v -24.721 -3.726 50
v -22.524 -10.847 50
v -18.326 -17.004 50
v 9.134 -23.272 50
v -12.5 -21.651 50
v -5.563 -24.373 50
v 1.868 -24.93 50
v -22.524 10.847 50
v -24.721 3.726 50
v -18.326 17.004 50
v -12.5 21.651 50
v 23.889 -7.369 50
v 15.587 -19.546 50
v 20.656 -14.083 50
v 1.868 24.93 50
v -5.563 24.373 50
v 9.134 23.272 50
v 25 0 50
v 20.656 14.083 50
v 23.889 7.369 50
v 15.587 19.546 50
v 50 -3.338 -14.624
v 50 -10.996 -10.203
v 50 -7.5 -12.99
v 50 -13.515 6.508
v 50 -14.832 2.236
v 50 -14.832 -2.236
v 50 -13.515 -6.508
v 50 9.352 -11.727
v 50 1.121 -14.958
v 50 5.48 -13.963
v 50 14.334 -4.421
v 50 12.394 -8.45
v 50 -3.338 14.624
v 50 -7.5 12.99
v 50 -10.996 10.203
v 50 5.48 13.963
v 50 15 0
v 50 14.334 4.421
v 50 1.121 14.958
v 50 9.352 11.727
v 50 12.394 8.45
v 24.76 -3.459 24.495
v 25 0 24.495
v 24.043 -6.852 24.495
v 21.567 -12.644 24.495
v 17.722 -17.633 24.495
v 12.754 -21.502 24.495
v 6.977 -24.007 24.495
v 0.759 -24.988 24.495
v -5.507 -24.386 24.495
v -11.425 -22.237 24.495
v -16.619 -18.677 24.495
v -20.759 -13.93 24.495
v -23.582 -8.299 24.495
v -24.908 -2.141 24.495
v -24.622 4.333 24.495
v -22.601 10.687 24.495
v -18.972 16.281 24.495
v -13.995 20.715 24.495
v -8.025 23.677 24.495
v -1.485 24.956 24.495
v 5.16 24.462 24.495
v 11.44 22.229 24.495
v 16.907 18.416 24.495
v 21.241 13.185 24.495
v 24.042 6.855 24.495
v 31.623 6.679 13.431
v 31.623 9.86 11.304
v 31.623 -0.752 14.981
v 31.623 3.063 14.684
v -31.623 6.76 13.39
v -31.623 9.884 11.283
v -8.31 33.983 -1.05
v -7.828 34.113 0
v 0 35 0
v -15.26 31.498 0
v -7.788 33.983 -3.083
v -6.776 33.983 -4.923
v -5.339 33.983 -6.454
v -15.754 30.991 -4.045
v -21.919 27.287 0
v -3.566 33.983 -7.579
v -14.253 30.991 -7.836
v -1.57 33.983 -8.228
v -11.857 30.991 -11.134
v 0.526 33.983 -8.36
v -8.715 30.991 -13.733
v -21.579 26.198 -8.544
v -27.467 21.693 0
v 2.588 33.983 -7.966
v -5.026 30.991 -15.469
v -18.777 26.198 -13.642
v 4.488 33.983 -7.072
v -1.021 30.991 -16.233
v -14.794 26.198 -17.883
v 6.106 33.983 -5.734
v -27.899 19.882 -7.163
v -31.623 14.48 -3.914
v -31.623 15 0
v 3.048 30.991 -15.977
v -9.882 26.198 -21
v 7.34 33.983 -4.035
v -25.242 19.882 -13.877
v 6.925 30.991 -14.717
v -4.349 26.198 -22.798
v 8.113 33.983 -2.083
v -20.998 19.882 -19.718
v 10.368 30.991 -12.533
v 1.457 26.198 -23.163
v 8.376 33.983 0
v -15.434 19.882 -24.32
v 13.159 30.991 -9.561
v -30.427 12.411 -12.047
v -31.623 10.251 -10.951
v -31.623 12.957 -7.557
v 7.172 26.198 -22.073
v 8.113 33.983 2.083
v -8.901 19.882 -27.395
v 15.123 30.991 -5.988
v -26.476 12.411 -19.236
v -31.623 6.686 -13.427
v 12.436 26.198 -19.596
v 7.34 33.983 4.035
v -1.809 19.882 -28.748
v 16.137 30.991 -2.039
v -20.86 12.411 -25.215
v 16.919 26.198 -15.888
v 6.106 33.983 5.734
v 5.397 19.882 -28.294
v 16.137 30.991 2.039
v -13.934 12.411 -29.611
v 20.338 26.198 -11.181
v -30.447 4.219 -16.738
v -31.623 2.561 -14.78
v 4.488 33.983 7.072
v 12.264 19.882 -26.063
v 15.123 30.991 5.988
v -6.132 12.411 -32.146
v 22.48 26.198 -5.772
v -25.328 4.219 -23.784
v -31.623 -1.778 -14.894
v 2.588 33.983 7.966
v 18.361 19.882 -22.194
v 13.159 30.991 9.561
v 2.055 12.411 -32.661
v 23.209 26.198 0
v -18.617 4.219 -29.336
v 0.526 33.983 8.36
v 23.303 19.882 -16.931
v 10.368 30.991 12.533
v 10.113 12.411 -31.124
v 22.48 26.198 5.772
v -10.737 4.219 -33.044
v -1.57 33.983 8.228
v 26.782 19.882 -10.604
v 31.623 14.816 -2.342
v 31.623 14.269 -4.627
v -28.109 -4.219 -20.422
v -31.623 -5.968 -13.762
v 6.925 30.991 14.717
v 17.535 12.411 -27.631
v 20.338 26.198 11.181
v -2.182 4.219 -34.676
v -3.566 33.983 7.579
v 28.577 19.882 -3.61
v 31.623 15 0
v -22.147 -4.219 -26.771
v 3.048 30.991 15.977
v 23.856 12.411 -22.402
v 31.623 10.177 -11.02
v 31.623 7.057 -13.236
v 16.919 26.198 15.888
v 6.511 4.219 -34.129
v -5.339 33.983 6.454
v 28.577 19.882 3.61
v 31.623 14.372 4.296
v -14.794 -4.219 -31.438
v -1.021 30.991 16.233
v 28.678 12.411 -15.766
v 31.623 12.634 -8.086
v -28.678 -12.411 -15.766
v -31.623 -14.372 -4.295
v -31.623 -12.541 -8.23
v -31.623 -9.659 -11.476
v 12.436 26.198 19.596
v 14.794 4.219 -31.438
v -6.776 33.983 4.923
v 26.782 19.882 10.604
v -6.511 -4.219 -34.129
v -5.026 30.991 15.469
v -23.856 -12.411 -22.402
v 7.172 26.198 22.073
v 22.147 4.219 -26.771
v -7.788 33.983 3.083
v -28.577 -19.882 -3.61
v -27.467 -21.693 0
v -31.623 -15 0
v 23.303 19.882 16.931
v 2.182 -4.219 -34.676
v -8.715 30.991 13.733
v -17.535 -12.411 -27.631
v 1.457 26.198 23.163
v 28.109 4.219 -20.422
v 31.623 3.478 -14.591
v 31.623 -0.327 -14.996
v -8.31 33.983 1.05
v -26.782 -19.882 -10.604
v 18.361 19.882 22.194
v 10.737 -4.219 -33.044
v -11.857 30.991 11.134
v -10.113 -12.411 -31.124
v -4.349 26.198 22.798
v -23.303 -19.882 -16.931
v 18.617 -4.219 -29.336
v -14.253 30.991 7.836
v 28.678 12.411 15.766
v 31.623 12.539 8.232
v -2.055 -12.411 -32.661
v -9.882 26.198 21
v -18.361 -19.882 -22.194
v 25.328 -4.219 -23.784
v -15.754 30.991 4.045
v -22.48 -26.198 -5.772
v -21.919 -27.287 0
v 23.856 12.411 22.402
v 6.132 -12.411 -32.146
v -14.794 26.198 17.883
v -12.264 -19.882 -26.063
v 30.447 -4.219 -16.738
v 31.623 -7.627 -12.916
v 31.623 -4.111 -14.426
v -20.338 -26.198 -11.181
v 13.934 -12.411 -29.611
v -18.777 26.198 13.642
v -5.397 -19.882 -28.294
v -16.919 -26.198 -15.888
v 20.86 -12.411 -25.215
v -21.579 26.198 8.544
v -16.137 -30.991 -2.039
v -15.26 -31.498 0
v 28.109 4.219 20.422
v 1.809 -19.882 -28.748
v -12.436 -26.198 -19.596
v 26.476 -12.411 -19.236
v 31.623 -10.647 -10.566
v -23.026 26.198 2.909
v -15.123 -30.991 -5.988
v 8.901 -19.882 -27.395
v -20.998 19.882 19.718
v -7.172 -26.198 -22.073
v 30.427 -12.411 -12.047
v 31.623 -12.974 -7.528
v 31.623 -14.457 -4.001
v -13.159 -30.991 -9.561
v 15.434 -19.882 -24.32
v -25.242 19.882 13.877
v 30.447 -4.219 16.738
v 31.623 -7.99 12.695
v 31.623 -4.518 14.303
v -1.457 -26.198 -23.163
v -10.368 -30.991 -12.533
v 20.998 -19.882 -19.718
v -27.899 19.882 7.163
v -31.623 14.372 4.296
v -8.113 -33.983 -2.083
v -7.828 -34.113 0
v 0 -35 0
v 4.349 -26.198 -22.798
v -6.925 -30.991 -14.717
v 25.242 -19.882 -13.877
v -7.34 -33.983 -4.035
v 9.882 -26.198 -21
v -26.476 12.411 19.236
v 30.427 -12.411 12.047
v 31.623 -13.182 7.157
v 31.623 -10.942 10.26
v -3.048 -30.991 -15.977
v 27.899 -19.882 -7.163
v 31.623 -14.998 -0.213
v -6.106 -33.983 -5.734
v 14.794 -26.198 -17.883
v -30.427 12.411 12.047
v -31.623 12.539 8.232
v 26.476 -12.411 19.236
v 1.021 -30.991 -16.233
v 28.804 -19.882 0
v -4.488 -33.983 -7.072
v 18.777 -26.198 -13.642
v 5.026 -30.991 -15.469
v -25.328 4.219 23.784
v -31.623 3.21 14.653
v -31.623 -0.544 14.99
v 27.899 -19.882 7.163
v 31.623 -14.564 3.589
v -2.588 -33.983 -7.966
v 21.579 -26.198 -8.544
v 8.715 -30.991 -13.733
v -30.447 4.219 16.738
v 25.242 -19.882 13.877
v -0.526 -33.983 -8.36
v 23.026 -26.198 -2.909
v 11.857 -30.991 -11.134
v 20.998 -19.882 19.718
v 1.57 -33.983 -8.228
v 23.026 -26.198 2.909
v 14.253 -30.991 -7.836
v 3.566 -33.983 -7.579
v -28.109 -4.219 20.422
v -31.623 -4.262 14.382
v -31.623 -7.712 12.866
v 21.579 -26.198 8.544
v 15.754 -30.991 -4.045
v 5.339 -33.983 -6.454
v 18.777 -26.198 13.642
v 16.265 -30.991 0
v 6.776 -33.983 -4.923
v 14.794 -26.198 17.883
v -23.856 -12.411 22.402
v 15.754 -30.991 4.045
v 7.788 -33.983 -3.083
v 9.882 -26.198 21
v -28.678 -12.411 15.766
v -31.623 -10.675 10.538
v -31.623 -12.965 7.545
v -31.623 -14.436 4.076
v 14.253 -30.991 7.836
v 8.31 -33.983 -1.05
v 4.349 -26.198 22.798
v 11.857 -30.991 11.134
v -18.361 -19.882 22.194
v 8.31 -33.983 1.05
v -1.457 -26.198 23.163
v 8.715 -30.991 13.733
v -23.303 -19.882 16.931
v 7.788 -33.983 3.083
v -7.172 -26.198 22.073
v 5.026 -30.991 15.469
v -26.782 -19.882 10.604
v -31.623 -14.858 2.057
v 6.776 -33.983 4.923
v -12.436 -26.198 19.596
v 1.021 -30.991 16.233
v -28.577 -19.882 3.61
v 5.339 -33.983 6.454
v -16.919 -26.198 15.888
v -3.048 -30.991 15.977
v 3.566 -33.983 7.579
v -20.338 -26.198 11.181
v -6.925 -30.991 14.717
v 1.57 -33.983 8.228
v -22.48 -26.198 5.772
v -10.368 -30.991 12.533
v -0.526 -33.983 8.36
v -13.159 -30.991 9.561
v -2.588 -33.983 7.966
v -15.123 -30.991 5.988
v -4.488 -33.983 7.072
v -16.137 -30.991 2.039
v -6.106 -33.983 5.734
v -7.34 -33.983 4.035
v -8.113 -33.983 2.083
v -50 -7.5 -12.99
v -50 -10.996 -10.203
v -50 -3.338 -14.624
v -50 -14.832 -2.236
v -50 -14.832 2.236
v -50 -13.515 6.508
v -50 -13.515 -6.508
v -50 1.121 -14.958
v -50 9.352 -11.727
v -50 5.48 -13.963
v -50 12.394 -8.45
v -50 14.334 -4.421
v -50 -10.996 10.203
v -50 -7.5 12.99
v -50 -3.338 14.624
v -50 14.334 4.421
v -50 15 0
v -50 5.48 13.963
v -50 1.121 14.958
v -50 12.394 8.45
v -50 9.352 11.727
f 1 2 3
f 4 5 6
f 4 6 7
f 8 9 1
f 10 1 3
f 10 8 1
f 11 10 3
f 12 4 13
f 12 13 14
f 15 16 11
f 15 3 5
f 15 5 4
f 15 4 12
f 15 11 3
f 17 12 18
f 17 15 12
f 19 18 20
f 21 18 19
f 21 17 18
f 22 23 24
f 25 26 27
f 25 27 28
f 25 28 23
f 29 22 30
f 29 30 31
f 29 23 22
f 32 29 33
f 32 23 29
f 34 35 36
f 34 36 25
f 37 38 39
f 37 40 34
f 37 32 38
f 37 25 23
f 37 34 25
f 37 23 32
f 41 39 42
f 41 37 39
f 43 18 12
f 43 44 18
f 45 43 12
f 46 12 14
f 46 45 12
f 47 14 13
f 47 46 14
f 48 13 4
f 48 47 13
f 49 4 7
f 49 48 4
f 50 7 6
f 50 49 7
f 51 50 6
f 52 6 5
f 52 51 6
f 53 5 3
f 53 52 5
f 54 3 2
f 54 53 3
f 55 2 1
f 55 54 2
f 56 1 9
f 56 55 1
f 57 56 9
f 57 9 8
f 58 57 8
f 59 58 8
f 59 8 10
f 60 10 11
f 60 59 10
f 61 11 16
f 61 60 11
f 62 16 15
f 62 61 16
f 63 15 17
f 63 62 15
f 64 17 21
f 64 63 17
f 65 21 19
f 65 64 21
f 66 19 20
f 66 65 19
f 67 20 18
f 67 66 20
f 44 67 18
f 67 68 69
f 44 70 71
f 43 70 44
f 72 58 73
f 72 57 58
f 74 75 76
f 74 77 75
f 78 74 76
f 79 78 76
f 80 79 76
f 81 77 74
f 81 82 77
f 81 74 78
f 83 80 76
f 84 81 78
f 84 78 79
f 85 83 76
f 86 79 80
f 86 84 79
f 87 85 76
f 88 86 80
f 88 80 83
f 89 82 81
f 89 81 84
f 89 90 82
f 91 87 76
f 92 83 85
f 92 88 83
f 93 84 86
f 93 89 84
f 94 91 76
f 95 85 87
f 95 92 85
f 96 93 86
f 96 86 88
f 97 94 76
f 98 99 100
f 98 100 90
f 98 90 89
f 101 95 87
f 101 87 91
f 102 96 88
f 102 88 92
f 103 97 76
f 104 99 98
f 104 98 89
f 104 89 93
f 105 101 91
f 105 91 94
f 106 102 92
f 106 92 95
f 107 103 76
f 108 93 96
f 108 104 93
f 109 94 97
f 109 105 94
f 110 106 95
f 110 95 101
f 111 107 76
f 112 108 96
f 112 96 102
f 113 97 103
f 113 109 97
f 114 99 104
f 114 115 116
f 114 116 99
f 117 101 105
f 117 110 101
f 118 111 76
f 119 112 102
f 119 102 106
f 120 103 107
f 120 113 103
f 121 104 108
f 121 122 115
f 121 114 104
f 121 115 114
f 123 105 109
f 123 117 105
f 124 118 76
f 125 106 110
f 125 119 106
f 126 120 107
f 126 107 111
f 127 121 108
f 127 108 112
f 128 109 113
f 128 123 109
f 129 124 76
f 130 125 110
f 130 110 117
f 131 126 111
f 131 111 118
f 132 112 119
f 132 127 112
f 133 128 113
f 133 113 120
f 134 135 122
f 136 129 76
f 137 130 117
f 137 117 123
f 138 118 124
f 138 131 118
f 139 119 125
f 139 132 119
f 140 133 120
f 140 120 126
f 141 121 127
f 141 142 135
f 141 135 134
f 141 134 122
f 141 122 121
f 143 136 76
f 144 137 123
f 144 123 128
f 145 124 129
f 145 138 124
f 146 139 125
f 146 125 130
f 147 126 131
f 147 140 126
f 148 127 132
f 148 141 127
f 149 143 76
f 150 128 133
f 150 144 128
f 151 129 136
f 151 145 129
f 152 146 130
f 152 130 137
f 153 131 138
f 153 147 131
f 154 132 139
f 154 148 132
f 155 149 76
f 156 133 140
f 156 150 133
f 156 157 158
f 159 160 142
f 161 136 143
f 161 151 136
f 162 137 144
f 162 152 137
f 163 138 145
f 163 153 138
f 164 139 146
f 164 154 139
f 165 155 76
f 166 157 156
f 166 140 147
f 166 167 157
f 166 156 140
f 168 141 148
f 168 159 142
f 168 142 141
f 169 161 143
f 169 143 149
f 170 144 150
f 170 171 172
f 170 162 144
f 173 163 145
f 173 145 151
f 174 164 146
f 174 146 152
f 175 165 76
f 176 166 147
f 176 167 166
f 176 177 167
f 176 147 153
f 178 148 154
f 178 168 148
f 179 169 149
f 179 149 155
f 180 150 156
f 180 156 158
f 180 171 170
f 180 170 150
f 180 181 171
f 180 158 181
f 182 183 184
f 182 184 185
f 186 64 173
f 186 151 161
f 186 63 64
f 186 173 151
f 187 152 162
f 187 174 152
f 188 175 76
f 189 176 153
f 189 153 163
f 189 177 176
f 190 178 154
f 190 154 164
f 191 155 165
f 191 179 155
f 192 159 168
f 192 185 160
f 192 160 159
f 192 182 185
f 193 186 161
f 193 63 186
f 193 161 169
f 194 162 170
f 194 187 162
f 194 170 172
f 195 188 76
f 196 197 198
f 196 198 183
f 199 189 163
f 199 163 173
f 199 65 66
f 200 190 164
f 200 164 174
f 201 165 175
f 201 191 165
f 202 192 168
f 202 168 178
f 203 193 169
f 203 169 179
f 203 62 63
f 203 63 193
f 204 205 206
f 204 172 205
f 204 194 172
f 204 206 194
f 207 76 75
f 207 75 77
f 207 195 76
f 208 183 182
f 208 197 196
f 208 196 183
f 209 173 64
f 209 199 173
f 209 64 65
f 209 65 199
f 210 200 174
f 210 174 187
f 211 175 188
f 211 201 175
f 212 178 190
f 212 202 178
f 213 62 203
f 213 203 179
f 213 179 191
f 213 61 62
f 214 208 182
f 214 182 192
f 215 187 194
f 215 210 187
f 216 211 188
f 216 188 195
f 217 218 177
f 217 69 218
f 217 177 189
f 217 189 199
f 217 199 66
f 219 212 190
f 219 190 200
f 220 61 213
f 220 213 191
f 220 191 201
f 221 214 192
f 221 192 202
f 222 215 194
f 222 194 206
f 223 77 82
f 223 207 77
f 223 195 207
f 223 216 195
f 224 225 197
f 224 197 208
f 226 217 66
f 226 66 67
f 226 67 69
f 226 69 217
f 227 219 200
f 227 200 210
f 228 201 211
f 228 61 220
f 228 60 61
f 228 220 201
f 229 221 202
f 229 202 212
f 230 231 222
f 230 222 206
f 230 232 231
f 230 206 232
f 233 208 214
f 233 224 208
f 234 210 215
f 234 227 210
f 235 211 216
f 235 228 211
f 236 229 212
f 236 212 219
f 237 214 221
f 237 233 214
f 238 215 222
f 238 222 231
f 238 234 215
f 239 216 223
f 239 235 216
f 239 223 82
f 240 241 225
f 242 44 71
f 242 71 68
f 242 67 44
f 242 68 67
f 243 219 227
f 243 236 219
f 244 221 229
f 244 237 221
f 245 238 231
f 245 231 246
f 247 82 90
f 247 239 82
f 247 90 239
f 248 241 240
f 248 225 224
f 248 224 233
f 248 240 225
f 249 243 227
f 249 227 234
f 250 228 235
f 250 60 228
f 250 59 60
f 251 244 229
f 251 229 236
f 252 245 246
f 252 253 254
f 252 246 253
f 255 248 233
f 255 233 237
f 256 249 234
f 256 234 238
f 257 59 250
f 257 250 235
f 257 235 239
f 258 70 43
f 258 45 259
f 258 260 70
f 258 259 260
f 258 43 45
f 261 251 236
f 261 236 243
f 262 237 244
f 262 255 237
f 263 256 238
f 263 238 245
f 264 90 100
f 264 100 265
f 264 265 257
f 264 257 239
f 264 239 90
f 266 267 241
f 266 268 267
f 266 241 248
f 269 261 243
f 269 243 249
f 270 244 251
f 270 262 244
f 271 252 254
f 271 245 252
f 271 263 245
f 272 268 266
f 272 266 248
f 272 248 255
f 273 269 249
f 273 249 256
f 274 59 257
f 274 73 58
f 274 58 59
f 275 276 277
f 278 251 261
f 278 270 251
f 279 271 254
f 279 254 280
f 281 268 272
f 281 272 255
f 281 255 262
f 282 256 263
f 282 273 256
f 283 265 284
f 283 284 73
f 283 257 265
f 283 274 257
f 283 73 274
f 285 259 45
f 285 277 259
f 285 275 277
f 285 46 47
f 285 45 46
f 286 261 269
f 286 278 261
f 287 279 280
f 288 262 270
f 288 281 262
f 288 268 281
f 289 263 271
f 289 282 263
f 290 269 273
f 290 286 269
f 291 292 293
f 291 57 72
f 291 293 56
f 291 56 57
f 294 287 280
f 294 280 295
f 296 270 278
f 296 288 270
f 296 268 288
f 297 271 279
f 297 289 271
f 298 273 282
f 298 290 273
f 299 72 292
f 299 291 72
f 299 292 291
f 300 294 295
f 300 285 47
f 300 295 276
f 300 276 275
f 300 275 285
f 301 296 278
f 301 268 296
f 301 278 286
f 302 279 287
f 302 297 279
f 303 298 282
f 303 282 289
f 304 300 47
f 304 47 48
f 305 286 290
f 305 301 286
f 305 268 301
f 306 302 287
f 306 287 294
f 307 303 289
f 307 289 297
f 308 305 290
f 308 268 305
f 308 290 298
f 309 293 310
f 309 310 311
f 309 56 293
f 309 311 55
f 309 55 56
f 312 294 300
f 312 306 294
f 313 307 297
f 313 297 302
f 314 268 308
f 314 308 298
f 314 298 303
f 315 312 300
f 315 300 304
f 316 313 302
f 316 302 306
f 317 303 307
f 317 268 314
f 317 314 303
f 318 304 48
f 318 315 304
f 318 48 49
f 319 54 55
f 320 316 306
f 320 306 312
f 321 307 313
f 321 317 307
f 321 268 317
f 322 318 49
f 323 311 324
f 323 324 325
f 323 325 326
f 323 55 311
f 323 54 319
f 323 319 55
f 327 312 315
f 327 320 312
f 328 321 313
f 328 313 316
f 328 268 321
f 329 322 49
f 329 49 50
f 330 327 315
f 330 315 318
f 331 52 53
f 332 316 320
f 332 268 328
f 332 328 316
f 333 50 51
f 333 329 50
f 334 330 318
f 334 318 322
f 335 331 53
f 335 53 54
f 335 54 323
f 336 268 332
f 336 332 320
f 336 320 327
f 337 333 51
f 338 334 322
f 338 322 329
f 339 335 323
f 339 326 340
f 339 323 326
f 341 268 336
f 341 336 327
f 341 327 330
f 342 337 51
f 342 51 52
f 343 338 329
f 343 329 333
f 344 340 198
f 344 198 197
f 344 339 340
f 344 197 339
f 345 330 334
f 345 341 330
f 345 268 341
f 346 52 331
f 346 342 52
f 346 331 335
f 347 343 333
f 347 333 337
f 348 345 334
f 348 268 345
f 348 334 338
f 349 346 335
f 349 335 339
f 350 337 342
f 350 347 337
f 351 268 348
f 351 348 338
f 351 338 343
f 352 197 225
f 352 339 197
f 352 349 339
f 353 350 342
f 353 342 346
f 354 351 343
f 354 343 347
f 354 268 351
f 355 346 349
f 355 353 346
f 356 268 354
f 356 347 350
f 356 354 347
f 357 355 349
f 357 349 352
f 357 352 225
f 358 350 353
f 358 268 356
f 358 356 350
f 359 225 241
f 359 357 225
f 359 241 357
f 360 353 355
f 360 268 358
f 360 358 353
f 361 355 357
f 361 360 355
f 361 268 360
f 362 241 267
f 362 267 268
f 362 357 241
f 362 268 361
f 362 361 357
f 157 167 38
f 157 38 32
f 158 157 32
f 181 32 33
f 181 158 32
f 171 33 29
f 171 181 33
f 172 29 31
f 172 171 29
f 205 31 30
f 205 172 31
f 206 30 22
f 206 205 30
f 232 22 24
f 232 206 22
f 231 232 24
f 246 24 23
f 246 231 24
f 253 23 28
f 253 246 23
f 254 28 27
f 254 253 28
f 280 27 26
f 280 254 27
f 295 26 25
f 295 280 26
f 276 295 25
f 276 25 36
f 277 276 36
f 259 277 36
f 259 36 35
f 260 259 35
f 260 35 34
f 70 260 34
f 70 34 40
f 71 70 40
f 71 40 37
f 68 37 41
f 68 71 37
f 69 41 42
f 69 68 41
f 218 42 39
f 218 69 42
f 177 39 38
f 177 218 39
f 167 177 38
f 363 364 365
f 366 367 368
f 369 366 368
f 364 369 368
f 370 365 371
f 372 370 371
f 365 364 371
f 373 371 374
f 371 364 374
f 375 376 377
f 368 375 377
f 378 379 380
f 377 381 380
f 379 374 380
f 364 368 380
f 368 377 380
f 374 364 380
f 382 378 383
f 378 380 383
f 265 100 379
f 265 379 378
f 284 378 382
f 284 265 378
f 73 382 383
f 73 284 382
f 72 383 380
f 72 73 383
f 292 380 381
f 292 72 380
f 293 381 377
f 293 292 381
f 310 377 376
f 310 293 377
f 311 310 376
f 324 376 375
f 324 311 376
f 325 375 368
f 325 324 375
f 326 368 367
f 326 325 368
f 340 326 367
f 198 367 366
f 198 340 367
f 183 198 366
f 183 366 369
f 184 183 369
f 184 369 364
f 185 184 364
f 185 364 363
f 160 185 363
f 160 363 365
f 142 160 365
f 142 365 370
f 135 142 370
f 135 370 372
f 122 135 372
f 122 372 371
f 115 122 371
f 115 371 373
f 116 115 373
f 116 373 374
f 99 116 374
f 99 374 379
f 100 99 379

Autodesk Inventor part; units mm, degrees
ref_plane "XZ Plane" through (0, 0, 0) normal (0, 1, 0) x (-1, 0, 0)
sketch "スケッチ1" plane through (0, 0, 0) normal (0, 0, 1) x (1, 0, 0)
  arc A0 (0, 35) -> (0, -35) centre (0, 0) ccw
  line L0 (0, 35) -> (0, -35)
  dimension "d0" = 70
revolve "回転1" add sketch "スケッチ1" angle 360 about axis through (0, 35, 0) along (0, -1, 0)
sketch "スケッチ2" plane through (0, 0, 0) normal (0, 0, 1) x (1, 0, 0)
  circle A0 centre (0, 0) radius 25
  dimension "d2" = 50
extrude "押し出し1" add sketch "スケッチ2" along normal blind 50
sketch "スケッチ3" plane through (0, 0, 0) normal (1, 0, 0) x (0, 1, 0)
  circle A0 centre (0, 0) radius 15
  dimension "d5" = 30
extrude "押し出し2" add sketch "スケッチ3" along normal mid plane 100
properties part number "UpperlegY"
